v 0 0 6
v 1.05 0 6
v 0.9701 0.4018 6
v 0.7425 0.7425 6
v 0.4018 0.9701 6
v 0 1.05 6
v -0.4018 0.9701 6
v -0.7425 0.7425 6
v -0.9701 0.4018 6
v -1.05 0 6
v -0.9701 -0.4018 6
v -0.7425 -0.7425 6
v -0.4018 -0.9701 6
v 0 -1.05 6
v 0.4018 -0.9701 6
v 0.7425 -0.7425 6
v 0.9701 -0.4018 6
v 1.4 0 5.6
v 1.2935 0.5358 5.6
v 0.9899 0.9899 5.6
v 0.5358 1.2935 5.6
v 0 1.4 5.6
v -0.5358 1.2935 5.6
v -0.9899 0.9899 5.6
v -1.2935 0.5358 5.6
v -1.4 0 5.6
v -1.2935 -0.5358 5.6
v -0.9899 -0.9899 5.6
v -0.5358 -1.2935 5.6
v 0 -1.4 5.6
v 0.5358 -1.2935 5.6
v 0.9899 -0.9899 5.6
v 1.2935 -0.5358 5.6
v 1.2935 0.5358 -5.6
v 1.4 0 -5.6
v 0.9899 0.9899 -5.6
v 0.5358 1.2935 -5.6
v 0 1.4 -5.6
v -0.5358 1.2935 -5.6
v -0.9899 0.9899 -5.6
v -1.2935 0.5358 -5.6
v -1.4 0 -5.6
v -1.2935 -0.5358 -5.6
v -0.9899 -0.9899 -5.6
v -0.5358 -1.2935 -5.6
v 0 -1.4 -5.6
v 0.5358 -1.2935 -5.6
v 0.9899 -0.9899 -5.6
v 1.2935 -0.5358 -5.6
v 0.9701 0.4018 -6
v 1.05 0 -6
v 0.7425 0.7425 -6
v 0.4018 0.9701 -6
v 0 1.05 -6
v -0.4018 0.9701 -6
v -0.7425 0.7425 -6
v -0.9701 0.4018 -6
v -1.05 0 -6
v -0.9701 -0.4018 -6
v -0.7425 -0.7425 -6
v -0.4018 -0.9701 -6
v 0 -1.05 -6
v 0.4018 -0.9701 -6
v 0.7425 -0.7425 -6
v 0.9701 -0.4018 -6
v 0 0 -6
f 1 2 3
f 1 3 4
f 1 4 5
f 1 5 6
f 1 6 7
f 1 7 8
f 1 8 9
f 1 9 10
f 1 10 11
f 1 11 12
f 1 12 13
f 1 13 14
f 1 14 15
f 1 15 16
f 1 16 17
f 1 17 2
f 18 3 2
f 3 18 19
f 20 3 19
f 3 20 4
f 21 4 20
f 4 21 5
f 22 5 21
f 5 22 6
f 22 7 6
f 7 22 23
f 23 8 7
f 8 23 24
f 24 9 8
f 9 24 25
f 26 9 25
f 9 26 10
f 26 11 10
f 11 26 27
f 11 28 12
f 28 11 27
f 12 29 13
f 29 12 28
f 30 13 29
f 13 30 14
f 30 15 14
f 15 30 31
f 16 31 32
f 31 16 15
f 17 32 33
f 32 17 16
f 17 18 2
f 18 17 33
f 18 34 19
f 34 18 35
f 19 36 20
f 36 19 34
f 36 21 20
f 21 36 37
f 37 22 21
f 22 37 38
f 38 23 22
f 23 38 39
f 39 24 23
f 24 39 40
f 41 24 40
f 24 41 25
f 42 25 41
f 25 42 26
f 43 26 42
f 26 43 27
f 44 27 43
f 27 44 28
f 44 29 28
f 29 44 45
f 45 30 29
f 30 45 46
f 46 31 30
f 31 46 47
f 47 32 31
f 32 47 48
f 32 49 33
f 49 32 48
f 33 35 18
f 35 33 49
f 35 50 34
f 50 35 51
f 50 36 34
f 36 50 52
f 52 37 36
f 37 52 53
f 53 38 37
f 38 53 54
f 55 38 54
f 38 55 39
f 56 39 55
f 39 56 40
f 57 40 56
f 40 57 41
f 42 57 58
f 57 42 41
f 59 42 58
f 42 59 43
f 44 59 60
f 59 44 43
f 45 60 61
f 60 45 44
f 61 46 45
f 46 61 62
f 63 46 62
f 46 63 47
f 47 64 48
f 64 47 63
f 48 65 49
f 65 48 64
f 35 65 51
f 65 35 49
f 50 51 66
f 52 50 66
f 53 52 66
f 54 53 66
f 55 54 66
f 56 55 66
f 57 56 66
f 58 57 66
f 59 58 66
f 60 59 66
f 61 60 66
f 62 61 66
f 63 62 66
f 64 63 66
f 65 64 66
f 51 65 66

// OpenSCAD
// file: ../p/4-4cyli.scad
use <../lib.scad>
function ldraw_lib__4_4cyli() = [
// 0 Cylinder 1.0
// 0 Name: 4-4cyli.dat
// 0 Author: James Jessiman
// 0 !LDRAW_ORG Primitive UPDATE 2005-01
// 0 !LICENSE Licensed under CC BY 4.0 : see CAreadme.txt
// 
// 0 BFC CERTIFY CCW
  [0,"BFC","CERTIFY"],
  [0,"BFC","CCW"],
// 
// 0 !HISTORY 1998-12-15 [PTadmin] Official Update 1998-10
// 0 !HISTORY 2002-03-23 [sbliss] Added BFC statement; merged headers from files in distributions LDraw 0.27 and Complete.
// 0 !HISTORY 2002-04-25 [PTadmin] Official Update 2002-02
// 0 !HISTORY 2004-12-14 [guyvivan] BFC CCW
// 0 !HISTORY 2005-12-28 [PTadmin] Official Update 2005-01
// 0 !HISTORY 2007-06-24 [PTadmin] Header formatted for Contributor Agreement
// 0 !HISTORY 2008-07-01 [PTadmin] Official Update 2008-01
// 
// 
// 4 16 1 1 0 0.9239 1 0.3827 0.9239 0 0.3827 1 0 0
  [4,16,1,1,0,0.9239,1,0.3827,0.9239,0,0.3827,1,0,0],
// 5 24 1 0 0 1 1 0 0.9239 0 0.3827 0.9239 0 -0.3827
  [5,24,1,0,0,1,1,0,0.9239,0,0.3827,0.9239,0,-0.3827],
// 4 16 0.9239 1 0.3827 0.7071 1 0.7071 0.7071 0 0.7071 0.9239 0 0.3827
  [4,16,0.9239,1,0.3827,0.7071,1,0.7071,0.7071,0,0.7071,0.9239,0,0.3827],
// 5 24 0.9239 0 0.3827 0.9239 1 0.3827 0.7071 0 0.7071 1 0 0
  [5,24,0.9239,0,0.3827,0.9239,1,0.3827,0.7071,0,0.7071,1,0,0],
// 4 16 0.7071 1 0.7071 0.3827 1 0.9239 0.3827 0 0.9239 0.7071 0 0.7071
  [4,16,0.7071,1,0.7071,0.3827,1,0.9239,0.3827,0,0.9239,0.7071,0,0.7071],
// 5 24 0.7071 0 0.7071 0.7071 1 0.7071 0.3827 0 0.9239 0.9239 0 0.3827
  [5,24,0.7071,0,0.7071,0.7071,1,0.7071,0.3827,0,0.9239,0.9239,0,0.3827],
// 4 16 0.3827 1 0.9239 0 1 1 0 0 1 0.3827 0 0.9239
  [4,16,0.3827,1,0.9239,0,1,1,0,0,1,0.3827,0,0.9239],
// 5 24 0.3827 0 0.9239 0.3827 1 0.9239 0 0 1 0.7071 0 0.7071
  [5,24,0.3827,0,0.9239,0.3827,1,0.9239,0,0,1,0.7071,0,0.7071],
// 4 16 0 1 1 -0.3827 1 0.9239 -0.3827 0 0.9239 0 0 1
  [4,16,0,1,1,-0.3827,1,0.9239,-0.3827,0,0.9239,0,0,1],
// 5 24 0 0 1 0 1 1 -0.3827 0 0.9239 0.3827 0 0.9239
  [5,24,0,0,1,0,1,1,-0.3827,0,0.9239,0.3827,0,0.9239],
// 4 16 -0.3827 1 0.9239 -0.7071 1 0.7071 -0.7071 0 0.7071 -0.3827 0 0.9239
  [4,16,-0.3827,1,0.9239,-0.7071,1,0.7071,-0.7071,0,0.7071,-0.3827,0,0.9239],
// 5 24 -0.3827 0 0.9239 -0.3827 1 0.9239 -0.7071 0 0.7071 0 0 1
  [5,24,-0.3827,0,0.9239,-0.3827,1,0.9239,-0.7071,0,0.7071,0,0,1],
// 4 16 -0.7071 1 0.7071 -0.9239 1 0.3827 -0.9239 0 0.3827 -0.7071 0 0.7071
  [4,16,-0.7071,1,0.7071,-0.9239,1,0.3827,-0.9239,0,0.3827,-0.7071,0,0.7071],
// 5 24 -0.7071 0 0.7071 -0.7071 1 0.7071 -0.9239 0 0.3827 -0.3827 0 0.9239
  [5,24,-0.7071,0,0.7071,-0.7071,1,0.7071,-0.9239,0,0.3827,-0.3827,0,0.9239],
// 4 16 -0.9239 1 0.3827 -1 1 0 -1 0 0 -0.9239 0 0.3827
  [4,16,-0.9239,1,0.3827,-1,1,0,-1,0,0,-0.9239,0,0.3827],
// 5 24 -0.9239 0 0.3827 -0.9239 1 0.3827 -1 0 0 -0.7071 0 0.7071
  [5,24,-0.9239,0,0.3827,-0.9239,1,0.3827,-1,0,0,-0.7071,0,0.7071],
// 4 16 -1 1 0 -0.9239 1 -0.3827 -0.9239 0 -0.3827 -1 0 0
  [4,16,-1,1,0,-0.9239,1,-0.3827,-0.9239,0,-0.3827,-1,0,0],
// 5 24 -1 0 0 -1 1 0 -0.9239 0 -0.3827 -0.9239 0 0.3827
  [5,24,-1,0,0,-1,1,0,-0.9239,0,-0.3827,-0.9239,0,0.3827],
// 4 16 -0.9239 1 -0.3827 -0.7071 1 -0.7071 -0.7071 0 -0.7071 -0.9239 0 -0.3827
  [4,16,-0.9239,1,-0.3827,-0.7071,1,-0.7071,-0.7071,0,-0.7071,-0.9239,0,-0.3827],
// 5 24 -0.9239 0 -0.3827 -0.9239 1 -0.3827 -0.7071 0 -0.7071 -1 0 0
  [5,24,-0.9239,0,-0.3827,-0.9239,1,-0.3827,-0.7071,0,-0.7071,-1,0,0],
// 4 16 -0.7071 1 -0.7071 -0.3827 1 -0.9239 -0.3827 0 -0.9239 -0.7071 0 -0.7071
  [4,16,-0.7071,1,-0.7071,-0.3827,1,-0.9239,-0.3827,0,-0.9239,-0.7071,0,-0.7071],
// 5 24 -0.7071 0 -0.7071 -0.7071 1 -0.7071 -0.3827 0 -0.9239 -0.9239 0 -0.3827
  [5,24,-0.7071,0,-0.7071,-0.7071,1,-0.7071,-0.3827,0,-0.9239,-0.9239,0,-0.3827],
// 4 16 -0.3827 1 -0.9239 0 1 -1 0 0 -1 -0.3827 0 -0.9239
  [4,16,-0.3827,1,-0.9239,0,1,-1,0,0,-1,-0.3827,0,-0.9239],
// 5 24 -0.3827 0 -0.9239 -0.3827 1 -0.9239 0 0 -1 -0.7071 0 -0.7071
  [5,24,-0.3827,0,-0.9239,-0.3827,1,-0.9239,0,0,-1,-0.7071,0,-0.7071],
// 4 16 0 1 -1 0.3827 1 -0.9239 0.3827 0 -0.9239 0 0 -1
  [4,16,0,1,-1,0.3827,1,-0.9239,0.3827,0,-0.9239,0,0,-1],
// 5 24 0 0 -1 0 1 -1 0.3827 0 -0.9239 -0.3827 0 -0.9239
  [5,24,0,0,-1,0,1,-1,0.3827,0,-0.9239,-0.3827,0,-0.9239],
// 4 16 0.3827 1 -0.9239 0.7071 1 -0.7071 0.7071 0 -0.7071 0.3827 0 -0.9239
  [4,16,0.3827,1,-0.9239,0.7071,1,-0.7071,0.7071,0,-0.7071,0.3827,0,-0.9239],
// 5 24 0.3827 0 -0.9239 0.3827 1 -0.9239 0.7071 0 -0.7071 0 0 -1
  [5,24,0.3827,0,-0.9239,0.3827,1,-0.9239,0.7071,0,-0.7071,0,0,-1],
// 4 16 0.7071 1 -0.7071 0.9239 1 -0.3827 0.9239 0 -0.3827 0.7071 0 -0.7071
  [4,16,0.7071,1,-0.7071,0.9239,1,-0.3827,0.9239,0,-0.3827,0.7071,0,-0.7071],
// 5 24 0.7071 0 -0.7071 0.7071 1 -0.7071 0.9239 0 -0.3827 0.3827 0 -0.9239
  [5,24,0.7071,0,-0.7071,0.7071,1,-0.7071,0.9239,0,-0.3827,0.3827,0,-0.9239],
// 4 16 0.9239 1 -0.3827 1 1 0 1 0 0 0.9239 0 -0.3827
  [4,16,0.9239,1,-0.3827,1,1,0,1,0,0,0.9239,0,-0.3827],
// 5 24 0.9239 0 -0.3827 0.9239 1 -0.3827 1 0 0 0.7071 0 -0.7071
  [5,24,0.9239,0,-0.3827,0.9239,1,-0.3827,1,0,0,0.7071,0,-0.7071],
// 0
];
module ldraw_lib__4_4cyli(step=0, col=false, unit=2/5, alt=false, line=0.2, solid=!$preview)
    makepoly(ldraw_lib__4_4cyli(), step=step, col=col, unit=unit, alt=alt, line=line, solid=solid);
ldraw_lib__4_4cyli(line=0.2);
// file: ../p/4-4edge.scad
use <../lib.scad>
function ldraw_lib__4_4edge() = [
// 0 Circle 1.0
// 0 Name: 4-4edge.dat
// 0 Author: James Jessiman
// 0 !LDRAW_ORG Primitive UPDATE 2017-01
// 0 !LICENSE Licensed under CC BY 4.0 : see CAreadme.txt
// 
// 0 BFC CERTIFY CCW
  [0,"BFC","CERTIFY"],
  [0,"BFC","CCW"],
// 
// 0 !HISTORY 1998-12-15 [PTadmin] Official Update 1998-10
// 0 !HISTORY 2005-12-28 [PTadmin] Official Update 2005-01
// 0 !HISTORY 2007-06-24 [PTadmin] Header formatted for Contributor Agreement
// 0 !HISTORY 2008-07-01 [PTadmin] Official Update 2008-01
// 0 !HISTORY 2017-01-15 [Steffen] BFCed
// 0 !HISTORY 2017-12-30 [PTadmin] Official Update 2017-01
// 
// 
// 2 24 1 0 0 0.9239 0 0.3827
  [2,24,1,0,0,0.9239,0,0.3827],
// 2 24 0.9239 0 0.3827 0.7071 0 0.7071
  [2,24,0.9239,0,0.3827,0.7071,0,0.7071],
// 2 24 0.7071 0 0.7071 0.3827 0 0.9239
  [2,24,0.7071,0,0.7071,0.3827,0,0.9239],
// 2 24 0.3827 0 0.9239 0 0 1
  [2,24,0.3827,0,0.9239,0,0,1],
// 2 24 0 0 1 -0.3827 0 0.9239
  [2,24,0,0,1,-0.3827,0,0.9239],
// 2 24 -0.3827 0 0.9239 -0.7071 0 0.7071
  [2,24,-0.3827,0,0.9239,-0.7071,0,0.7071],
// 2 24 -0.7071 0 0.7071 -0.9239 0 0.3827
  [2,24,-0.7071,0,0.7071,-0.9239,0,0.3827],
// 2 24 -0.9239 0 0.3827 -1 0 -0
  [2,24,-0.9239,0,0.3827,-1,0,-0],
// 2 24 -1 0 -0 -0.9239 0 -0.3827
  [2,24,-1,0,-0,-0.9239,0,-0.3827],
// 2 24 -0.9239 0 -0.3827 -0.7071 0 -0.7071
  [2,24,-0.9239,0,-0.3827,-0.7071,0,-0.7071],
// 2 24 -0.7071 0 -0.7071 -0.3827 0 -0.9239
  [2,24,-0.7071,0,-0.7071,-0.3827,0,-0.9239],
// 2 24 -0.3827 0 -0.9239 0 0 -1
  [2,24,-0.3827,0,-0.9239,0,0,-1],
// 2 24 0 0 -1 0.3827 0 -0.9239
  [2,24,0,0,-1,0.3827,0,-0.9239],
// 2 24 0.3827 0 -0.9239 0.7071 0 -0.7071
  [2,24,0.3827,0,-0.9239,0.7071,0,-0.7071],
// 2 24 0.7071 0 -0.7071 0.9239 0 -0.3827
  [2,24,0.7071,0,-0.7071,0.9239,0,-0.3827],
// 2 24 0.9239 0 -0.3827 1 0 0
  [2,24,0.9239,0,-0.3827,1,0,0],
];
module ldraw_lib__4_4edge(step=0, col=false, unit=2/5, alt=false, line=0.2, solid=!$preview)
    makepoly(ldraw_lib__4_4edge(), step=step, col=col, unit=unit, alt=alt, line=line, solid=solid);
ldraw_lib__4_4edge(line=0.2);
// file: ../p/4-4disc.scad
use <../lib.scad>
function ldraw_lib__4_4disc() = [
// 0 Disc 1.0
// 0 Name: 4-4disc.dat
// 0 Author: James Jessiman
// 0 !LDRAW_ORG Primitive UPDATE 2002-02
// 0 !LICENSE Licensed under CC BY 4.0 : see CAreadme.txt
// 
// 0 BFC CERTIFY CCW
  [0,"BFC","CERTIFY"],
  [0,"BFC","CCW"],
// 
// 0 !HISTORY 1998-12-15 [PTadmin] Official Update 1998-10
// 0 !HISTORY 2002-03-23 [sbliss] Added BFC statement
// 0 !HISTORY 2002-04-25 [PTadmin] Official Update 2002-02
// 0 !HISTORY 2007-06-24 [PTadmin] Header formatted for Contributor Agreement
// 0 !HISTORY 2008-07-01 [PTadmin] Official Update 2008-01
// 
// 
// 3 16 0 0 0 1 0 0 0.9239 0 0.3827
  [3,16,0,0,0,1,0,0,0.9239,0,0.3827],
// 3 16 0 0 0 0.9239 0 0.3827 0.7071 0 0.7071
  [3,16,0,0,0,0.9239,0,0.3827,0.7071,0,0.7071],
// 3 16 0 0 0 0.7071 0 0.7071 0.3827 0 0.9239
  [3,16,0,0,0,0.7071,0,0.7071,0.3827,0,0.9239],
// 3 16 0 0 0 0.3827 0 0.9239 0 0 1
  [3,16,0,0,0,0.3827,0,0.9239,0,0,1],
// 3 16 0 0 0 0 0 1 -0.3827 0 0.9239
  [3,16,0,0,0,0,0,1,-0.3827,0,0.9239],
// 3 16 0 0 0 -0.3827 0 0.9239 -0.7071 0 0.7071
  [3,16,0,0,0,-0.3827,0,0.9239,-0.7071,0,0.7071],
// 3 16 0 0 0 -0.7071 0 0.7071 -0.9239 0 0.3827
  [3,16,0,0,0,-0.7071,0,0.7071,-0.9239,0,0.3827],
// 3 16 0 0 0 -0.9239 0 0.3827 -1 0 -0
  [3,16,0,0,0,-0.9239,0,0.3827,-1,0,-0],
// 3 16 0 0 0 -1 0 -0 -0.9239 0 -0.3827
  [3,16,0,0,0,-1,0,-0,-0.9239,0,-0.3827],
// 3 16 0 0 0 -0.9239 0 -0.3827 -0.7071 0 -0.7071
  [3,16,0,0,0,-0.9239,0,-0.3827,-0.7071,0,-0.7071],
// 3 16 0 0 0 -0.7071 0 -0.7071 -0.3827 0 -0.9239
  [3,16,0,0,0,-0.7071,0,-0.7071,-0.3827,0,-0.9239],
// 3 16 0 0 0 -0.3827 0 -0.9239 0 0 -1
  [3,16,0,0,0,-0.3827,0,-0.9239,0,0,-1],
// 3 16 0 0 0 0 0 -1 0.3827 0 -0.9239
  [3,16,0,0,0,0,0,-1,0.3827,0,-0.9239],
// 3 16 0 0 0 0.3827 0 -0.9239 0.7071 0 -0.7071
  [3,16,0,0,0,0.3827,0,-0.9239,0.7071,0,-0.7071],
// 3 16 0 0 0 0.7071 0 -0.7071 0.9239 0 -0.3827
  [3,16,0,0,0,0.7071,0,-0.7071,0.9239,0,-0.3827],
// 3 16 0 0 0 0.9239 0 -0.3827 1 0 0
  [3,16,0,0,0,0.9239,0,-0.3827,1,0,0],
// 0
];
module ldraw_lib__4_4disc(step=0, col=false, unit=2/5, alt=false, line=0.2, solid=!$preview)
    makepoly(ldraw_lib__4_4disc(), step=step, col=col, unit=unit, alt=alt, line=line, solid=solid);
ldraw_lib__4_4disc(line=0.2);
// file: ../p/4-4cylo.scad
use <../lib.scad>
use <4-4cyli.scad>
use <4-4edge.scad>
function ldraw_lib__4_4cylo() = [
// 0 Cylinder Open 1.0
// 0 Name: 4-4cylo.dat
// 0 Author: Mark Kennedy [mkennedy]
// 0 !LDRAW_ORG Primitive UPDATE 2010-01
// 0 !LICENSE Licensed under CC BY 4.0 : see CAreadme.txt
// 
// 0 BFC CERTIFY CCW
  [0,"BFC","CERTIFY"],
  [0,"BFC","CCW"],
// 
// 0 !HISTORY 2010-04-05 [PTadmin] Official Update 2010-01
// 
// 
// 1 16 0 0 0 1 0 0 0 1 0 0 0 1 4-4edge.dat
  [1,16,0,0,0,1,0,0,0,1,0,0,0,1, ldraw_lib__4_4edge()],
// 1 16 0 1 0 1 0 0 0 1 0 0 0 1 4-4edge.dat
  [1,16,0,1,0,1,0,0,0,1,0,0,0,1, ldraw_lib__4_4edge()],
// 1 16 0 0 0 1 0 0 0 1 0 0 0 1 4-4cyli.dat
  [1,16,0,0,0,1,0,0,0,1,0,0,0,1, ldraw_lib__4_4cyli()],
// 0
];
module ldraw_lib__4_4cylo(step=0, col=false, unit=2/5, alt=false, line=0.2, solid=!$preview)
    makepoly(ldraw_lib__4_4cylo(), step=step, col=col, unit=unit, alt=alt, line=line, solid=solid);
ldraw_lib__4_4cylo(line=0.2);
// file: ../p/4-4con3.scad
use <../lib.scad>
function ldraw_lib__4_4con3() = [
// 0 Cone  3 x 1.0
// 0 Name: 4-4con3.dat
// 0 Author: Niels Karsdorp [nielsk]
// 0 !LDRAW_ORG Primitive UPDATE 2003-02
// 0 !LICENSE Licensed under CC BY 4.0 : see CAreadme.txt
// 
// 0 BFC CERTIFY CCW
  [0,"BFC","CERTIFY"],
  [0,"BFC","CCW"],
// 
// 0 !HISTORY 2003-08-01 [PTadmin] Official Update 2003-02
// 0 !HISTORY 2007-06-24 [PTadmin] Header formatted for Contributor Agreement
// 0 !HISTORY 2008-07-01 [PTadmin] Official Update 2008-01
// 
// 
// 5 24 3 1 0 4 0 0 2.7717 1 1.1481 2.7717 1 -1.1481
  [5,24,3,1,0,4,0,0,2.7717,1,1.1481,2.7717,1,-1.1481],
// 5 24 2.7717 1 1.1481 3.6956 0 1.5308 2.1213 1 2.1213 3 1 0
  [5,24,2.7717,1,1.1481,3.6956,0,1.5308,2.1213,1,2.1213,3,1,0],
// 5 24 2.1213 1 2.1213 2.8284 0 2.8284 1.1481 1 2.7717 2.7717 1 1.1481
  [5,24,2.1213,1,2.1213,2.8284,0,2.8284,1.1481,1,2.7717,2.7717,1,1.1481],
// 5 24 1.1481 1 2.7717 1.5308 0 3.6956 0 1 3 2.1213 1 2.1213
  [5,24,1.1481,1,2.7717,1.5308,0,3.6956,0,1,3,2.1213,1,2.1213],
// 5 24 0 1 3 0 0 4 -1.1481 1 2.7717 1.1481 1 2.7717
  [5,24,0,1,3,0,0,4,-1.1481,1,2.7717,1.1481,1,2.7717],
// 5 24 -1.1481 1 2.7717 -1.5308 0 3.6956 -2.1213 1 2.1213 0 1 3
  [5,24,-1.1481,1,2.7717,-1.5308,0,3.6956,-2.1213,1,2.1213,0,1,3],
// 5 24 -2.1213 1 2.1213 -2.8284 0 2.8284 -2.7717 1 1.1481 -1.1481 1 2.7717
  [5,24,-2.1213,1,2.1213,-2.8284,0,2.8284,-2.7717,1,1.1481,-1.1481,1,2.7717],
// 5 24 -2.7717 1 1.1481 -3.6956 0 1.5308 -3 1 0 -2.1213 1 2.1213
  [5,24,-2.7717,1,1.1481,-3.6956,0,1.5308,-3,1,0,-2.1213,1,2.1213],
// 5 24 -3 1 0 -4 0 0 -2.7717 1 -1.1481 -2.7717 1 1.1481
  [5,24,-3,1,0,-4,0,0,-2.7717,1,-1.1481,-2.7717,1,1.1481],
// 5 24 -2.7717 1 -1.1481 -3.6956 0 -1.5308 -2.1213 1 -2.1213 -3 1 0
  [5,24,-2.7717,1,-1.1481,-3.6956,0,-1.5308,-2.1213,1,-2.1213,-3,1,0],
// 5 24 -2.1213 1 -2.1213 -2.8284 0 -2.8284 -1.1481 1 -2.7717 -2.7717 1 -1.1481
  [5,24,-2.1213,1,-2.1213,-2.8284,0,-2.8284,-1.1481,1,-2.7717,-2.7717,1,-1.1481],
// 5 24 -1.1481 1 -2.7717 -1.5308 0 -3.6956 0 1 -3 -2.1213 1 -2.1213
  [5,24,-1.1481,1,-2.7717,-1.5308,0,-3.6956,0,1,-3,-2.1213,1,-2.1213],
// 5 24 0 1 -3 0 0 -4 1.1481 1 -2.7717 -1.1481 1 -2.7717
  [5,24,0,1,-3,0,0,-4,1.1481,1,-2.7717,-1.1481,1,-2.7717],
// 5 24 1.1481 1 -2.7717 1.5308 0 -3.6956 2.1213 1 -2.1213 0 1 -3
  [5,24,1.1481,1,-2.7717,1.5308,0,-3.6956,2.1213,1,-2.1213,0,1,-3],
// 5 24 2.1213 1 -2.1213 2.8284 0 -2.8284 2.7717 1 -1.1481 1.1481 1 -2.7717
  [5,24,2.1213,1,-2.1213,2.8284,0,-2.8284,2.7717,1,-1.1481,1.1481,1,-2.7717],
// 5 24 2.7717 1 -1.1481 3.6956 0 -1.5308 3 1 0 2.1213 1 -2.1213
  [5,24,2.7717,1,-1.1481,3.6956,0,-1.5308,3,1,0,2.1213,1,-2.1213],
// 
// 4 16 3 1 0 2.7717 1 1.1481 3.6956 0 1.5308 4 0 0
  [4,16,3,1,0,2.7717,1,1.1481,3.6956,0,1.5308,4,0,0],
// 4 16 2.7717 1 1.1481 2.1213 1 2.1213 2.8284 0 2.8284 3.6956 0 1.5308
  [4,16,2.7717,1,1.1481,2.1213,1,2.1213,2.8284,0,2.8284,3.6956,0,1.5308],
// 4 16 2.1213 1 2.1213 1.1481 1 2.7717 1.5308 0 3.6956 2.8284 0 2.8284
  [4,16,2.1213,1,2.1213,1.1481,1,2.7717,1.5308,0,3.6956,2.8284,0,2.8284],
// 4 16 1.1481 1 2.7717 0 1 3 0 0 4 1.5308 0 3.6956
  [4,16,1.1481,1,2.7717,0,1,3,0,0,4,1.5308,0,3.6956],
// 4 16 0 1 3 -1.1481 1 2.7717 -1.5308 0 3.6956 0 0 4
  [4,16,0,1,3,-1.1481,1,2.7717,-1.5308,0,3.6956,0,0,4],
// 4 16 -1.1481 1 2.7717 -2.1213 1 2.1213 -2.8284 0 2.8284 -1.5308 0 3.6956
  [4,16,-1.1481,1,2.7717,-2.1213,1,2.1213,-2.8284,0,2.8284,-1.5308,0,3.6956],
// 4 16 -2.1213 1 2.1213 -2.7717 1 1.1481 -3.6956 0 1.5308 -2.8284 0 2.8284
  [4,16,-2.1213,1,2.1213,-2.7717,1,1.1481,-3.6956,0,1.5308,-2.8284,0,2.8284],
// 4 16 -2.7717 1 1.1481 -3 1 0 -4 0 0 -3.6956 0 1.5308
  [4,16,-2.7717,1,1.1481,-3,1,0,-4,0,0,-3.6956,0,1.5308],
// 4 16 -3 1 0 -2.7717 1 -1.1481 -3.6956 0 -1.5308 -4 0 0
  [4,16,-3,1,0,-2.7717,1,-1.1481,-3.6956,0,-1.5308,-4,0,0],
// 4 16 -2.7717 1 -1.1481 -2.1213 1 -2.1213 -2.8284 0 -2.8284 -3.6956 0 -1.5308
  [4,16,-2.7717,1,-1.1481,-2.1213,1,-2.1213,-2.8284,0,-2.8284,-3.6956,0,-1.5308],
// 4 16 -2.1213 1 -2.1213 -1.1481 1 -2.7717 -1.5308 0 -3.6956 -2.8284 0 -2.8284
  [4,16,-2.1213,1,-2.1213,-1.1481,1,-2.7717,-1.5308,0,-3.6956,-2.8284,0,-2.8284],
// 4 16 -1.1481 1 -2.7717 0 1 -3 0 0 -4 -1.5308 0 -3.6956
  [4,16,-1.1481,1,-2.7717,0,1,-3,0,0,-4,-1.5308,0,-3.6956],
// 4 16 0 1 -3 1.1481 1 -2.7717 1.5308 0 -3.6956 0 0 -4
  [4,16,0,1,-3,1.1481,1,-2.7717,1.5308,0,-3.6956,0,0,-4],
// 4 16 1.1481 1 -2.7717 2.1213 1 -2.1213 2.8284 0 -2.8284 1.5308 0 -3.6956
  [4,16,1.1481,1,-2.7717,2.1213,1,-2.1213,2.8284,0,-2.8284,1.5308,0,-3.6956],
// 4 16 2.1213 1 -2.1213 2.7717 1 -1.1481 3.6956 0 -1.5308 2.8284 0 -2.8284
  [4,16,2.1213,1,-2.1213,2.7717,1,-1.1481,3.6956,0,-1.5308,2.8284,0,-2.8284],
// 4 16 2.7717 1 -1.1481 3 1 0 4 0 0 3.6956 0 -1.5308
  [4,16,2.7717,1,-1.1481,3,1,0,4,0,0,3.6956,0,-1.5308],
// 
// 0
// 
];
module ldraw_lib__4_4con3(step=0, col=false, unit=2/5, alt=false, line=0.2, solid=!$preview)
    makepoly(ldraw_lib__4_4con3(), step=step, col=col, unit=unit, alt=alt, line=line, solid=solid);
ldraw_lib__4_4con3(line=0.2);
// main file
use <../lib.scad>
use <../p/4-4con3.scad>
use <../p/4-4cylo.scad>
use <../p/4-4disc.scad>
use <../p/4-4edge.scad>
function ldraw_lib__33234() = [
// 0 ~Scala Lock Pin for Profile  2L
// 0 Name: 33234.dat
// 0 Author: Gerald Lasser [GeraldLasser]
// 0 !LDRAW_ORG Part UPDATE 2025-01
// 0 !LICENSE Licensed under CC BY 4.0 : see CAreadme.txt
// 
// 0 BFC CERTIFY CCW
  [0,"BFC","CERTIFY"],
  [0,"BFC","CCW"],
// 
// 0 !HISTORY 2025-01-20 [OrionP] Official Update 2025-01
// 
// 
// 1 16 0 -15 0 2.625 0 0 0 1 0 0 0 2.625 4-4edge.dat
  [1,16,0,-15,0,2.625,0,0,0,1,0,0,0,2.625, ldraw_lib__4_4edge()],
// 1 16 0 -15 0 2.625 0 0 0 1 0 0 0 2.625 4-4disc.dat
  [1,16,0,-15,0,2.625,0,0,0,1,0,0,0,2.625, ldraw_lib__4_4disc()],
// 1 16 0 -14 0 .875 0 0 0 -1 0 0 0 .875 4-4con3.dat
  [1,16,0,-14,0,.875,0,0,0,-1,0,0,0,.875, ldraw_lib__4_4con3()],
// 1 16 0 -14 0 3.5 0 0 0 28 0 0 0 3.5 4-4cylo.dat
  [1,16,0,-14,0,3.5,0,0,0,28,0,0,0,3.5, ldraw_lib__4_4cylo()],
// 1 16 0 14 0 .875 0 0 0 1 0 0 0 .875 4-4con3.dat
  [1,16,0,14,0,.875,0,0,0,1,0,0,0,.875, ldraw_lib__4_4con3()],
// 1 16 0 15 0 2.625 0 0 0 -1 0 0 0 2.625 4-4disc.dat
  [1,16,0,15,0,2.625,0,0,0,-1,0,0,0,2.625, ldraw_lib__4_4disc()],
// 1 16 0 15 0 2.625 0 0 0 1 0 0 0 2.625 4-4edge.dat
  [1,16,0,15,0,2.625,0,0,0,1,0,0,0,2.625, ldraw_lib__4_4edge()],
];
module ldraw_lib__33234(step=0, col=false, unit=2/5, alt=false, line=0.2, solid=!$preview)
    makepoly(ldraw_lib__33234(), step=step, col=col, unit=unit, alt=alt, line=line, solid=solid);
ldraw_lib__33234(line=0.2);
